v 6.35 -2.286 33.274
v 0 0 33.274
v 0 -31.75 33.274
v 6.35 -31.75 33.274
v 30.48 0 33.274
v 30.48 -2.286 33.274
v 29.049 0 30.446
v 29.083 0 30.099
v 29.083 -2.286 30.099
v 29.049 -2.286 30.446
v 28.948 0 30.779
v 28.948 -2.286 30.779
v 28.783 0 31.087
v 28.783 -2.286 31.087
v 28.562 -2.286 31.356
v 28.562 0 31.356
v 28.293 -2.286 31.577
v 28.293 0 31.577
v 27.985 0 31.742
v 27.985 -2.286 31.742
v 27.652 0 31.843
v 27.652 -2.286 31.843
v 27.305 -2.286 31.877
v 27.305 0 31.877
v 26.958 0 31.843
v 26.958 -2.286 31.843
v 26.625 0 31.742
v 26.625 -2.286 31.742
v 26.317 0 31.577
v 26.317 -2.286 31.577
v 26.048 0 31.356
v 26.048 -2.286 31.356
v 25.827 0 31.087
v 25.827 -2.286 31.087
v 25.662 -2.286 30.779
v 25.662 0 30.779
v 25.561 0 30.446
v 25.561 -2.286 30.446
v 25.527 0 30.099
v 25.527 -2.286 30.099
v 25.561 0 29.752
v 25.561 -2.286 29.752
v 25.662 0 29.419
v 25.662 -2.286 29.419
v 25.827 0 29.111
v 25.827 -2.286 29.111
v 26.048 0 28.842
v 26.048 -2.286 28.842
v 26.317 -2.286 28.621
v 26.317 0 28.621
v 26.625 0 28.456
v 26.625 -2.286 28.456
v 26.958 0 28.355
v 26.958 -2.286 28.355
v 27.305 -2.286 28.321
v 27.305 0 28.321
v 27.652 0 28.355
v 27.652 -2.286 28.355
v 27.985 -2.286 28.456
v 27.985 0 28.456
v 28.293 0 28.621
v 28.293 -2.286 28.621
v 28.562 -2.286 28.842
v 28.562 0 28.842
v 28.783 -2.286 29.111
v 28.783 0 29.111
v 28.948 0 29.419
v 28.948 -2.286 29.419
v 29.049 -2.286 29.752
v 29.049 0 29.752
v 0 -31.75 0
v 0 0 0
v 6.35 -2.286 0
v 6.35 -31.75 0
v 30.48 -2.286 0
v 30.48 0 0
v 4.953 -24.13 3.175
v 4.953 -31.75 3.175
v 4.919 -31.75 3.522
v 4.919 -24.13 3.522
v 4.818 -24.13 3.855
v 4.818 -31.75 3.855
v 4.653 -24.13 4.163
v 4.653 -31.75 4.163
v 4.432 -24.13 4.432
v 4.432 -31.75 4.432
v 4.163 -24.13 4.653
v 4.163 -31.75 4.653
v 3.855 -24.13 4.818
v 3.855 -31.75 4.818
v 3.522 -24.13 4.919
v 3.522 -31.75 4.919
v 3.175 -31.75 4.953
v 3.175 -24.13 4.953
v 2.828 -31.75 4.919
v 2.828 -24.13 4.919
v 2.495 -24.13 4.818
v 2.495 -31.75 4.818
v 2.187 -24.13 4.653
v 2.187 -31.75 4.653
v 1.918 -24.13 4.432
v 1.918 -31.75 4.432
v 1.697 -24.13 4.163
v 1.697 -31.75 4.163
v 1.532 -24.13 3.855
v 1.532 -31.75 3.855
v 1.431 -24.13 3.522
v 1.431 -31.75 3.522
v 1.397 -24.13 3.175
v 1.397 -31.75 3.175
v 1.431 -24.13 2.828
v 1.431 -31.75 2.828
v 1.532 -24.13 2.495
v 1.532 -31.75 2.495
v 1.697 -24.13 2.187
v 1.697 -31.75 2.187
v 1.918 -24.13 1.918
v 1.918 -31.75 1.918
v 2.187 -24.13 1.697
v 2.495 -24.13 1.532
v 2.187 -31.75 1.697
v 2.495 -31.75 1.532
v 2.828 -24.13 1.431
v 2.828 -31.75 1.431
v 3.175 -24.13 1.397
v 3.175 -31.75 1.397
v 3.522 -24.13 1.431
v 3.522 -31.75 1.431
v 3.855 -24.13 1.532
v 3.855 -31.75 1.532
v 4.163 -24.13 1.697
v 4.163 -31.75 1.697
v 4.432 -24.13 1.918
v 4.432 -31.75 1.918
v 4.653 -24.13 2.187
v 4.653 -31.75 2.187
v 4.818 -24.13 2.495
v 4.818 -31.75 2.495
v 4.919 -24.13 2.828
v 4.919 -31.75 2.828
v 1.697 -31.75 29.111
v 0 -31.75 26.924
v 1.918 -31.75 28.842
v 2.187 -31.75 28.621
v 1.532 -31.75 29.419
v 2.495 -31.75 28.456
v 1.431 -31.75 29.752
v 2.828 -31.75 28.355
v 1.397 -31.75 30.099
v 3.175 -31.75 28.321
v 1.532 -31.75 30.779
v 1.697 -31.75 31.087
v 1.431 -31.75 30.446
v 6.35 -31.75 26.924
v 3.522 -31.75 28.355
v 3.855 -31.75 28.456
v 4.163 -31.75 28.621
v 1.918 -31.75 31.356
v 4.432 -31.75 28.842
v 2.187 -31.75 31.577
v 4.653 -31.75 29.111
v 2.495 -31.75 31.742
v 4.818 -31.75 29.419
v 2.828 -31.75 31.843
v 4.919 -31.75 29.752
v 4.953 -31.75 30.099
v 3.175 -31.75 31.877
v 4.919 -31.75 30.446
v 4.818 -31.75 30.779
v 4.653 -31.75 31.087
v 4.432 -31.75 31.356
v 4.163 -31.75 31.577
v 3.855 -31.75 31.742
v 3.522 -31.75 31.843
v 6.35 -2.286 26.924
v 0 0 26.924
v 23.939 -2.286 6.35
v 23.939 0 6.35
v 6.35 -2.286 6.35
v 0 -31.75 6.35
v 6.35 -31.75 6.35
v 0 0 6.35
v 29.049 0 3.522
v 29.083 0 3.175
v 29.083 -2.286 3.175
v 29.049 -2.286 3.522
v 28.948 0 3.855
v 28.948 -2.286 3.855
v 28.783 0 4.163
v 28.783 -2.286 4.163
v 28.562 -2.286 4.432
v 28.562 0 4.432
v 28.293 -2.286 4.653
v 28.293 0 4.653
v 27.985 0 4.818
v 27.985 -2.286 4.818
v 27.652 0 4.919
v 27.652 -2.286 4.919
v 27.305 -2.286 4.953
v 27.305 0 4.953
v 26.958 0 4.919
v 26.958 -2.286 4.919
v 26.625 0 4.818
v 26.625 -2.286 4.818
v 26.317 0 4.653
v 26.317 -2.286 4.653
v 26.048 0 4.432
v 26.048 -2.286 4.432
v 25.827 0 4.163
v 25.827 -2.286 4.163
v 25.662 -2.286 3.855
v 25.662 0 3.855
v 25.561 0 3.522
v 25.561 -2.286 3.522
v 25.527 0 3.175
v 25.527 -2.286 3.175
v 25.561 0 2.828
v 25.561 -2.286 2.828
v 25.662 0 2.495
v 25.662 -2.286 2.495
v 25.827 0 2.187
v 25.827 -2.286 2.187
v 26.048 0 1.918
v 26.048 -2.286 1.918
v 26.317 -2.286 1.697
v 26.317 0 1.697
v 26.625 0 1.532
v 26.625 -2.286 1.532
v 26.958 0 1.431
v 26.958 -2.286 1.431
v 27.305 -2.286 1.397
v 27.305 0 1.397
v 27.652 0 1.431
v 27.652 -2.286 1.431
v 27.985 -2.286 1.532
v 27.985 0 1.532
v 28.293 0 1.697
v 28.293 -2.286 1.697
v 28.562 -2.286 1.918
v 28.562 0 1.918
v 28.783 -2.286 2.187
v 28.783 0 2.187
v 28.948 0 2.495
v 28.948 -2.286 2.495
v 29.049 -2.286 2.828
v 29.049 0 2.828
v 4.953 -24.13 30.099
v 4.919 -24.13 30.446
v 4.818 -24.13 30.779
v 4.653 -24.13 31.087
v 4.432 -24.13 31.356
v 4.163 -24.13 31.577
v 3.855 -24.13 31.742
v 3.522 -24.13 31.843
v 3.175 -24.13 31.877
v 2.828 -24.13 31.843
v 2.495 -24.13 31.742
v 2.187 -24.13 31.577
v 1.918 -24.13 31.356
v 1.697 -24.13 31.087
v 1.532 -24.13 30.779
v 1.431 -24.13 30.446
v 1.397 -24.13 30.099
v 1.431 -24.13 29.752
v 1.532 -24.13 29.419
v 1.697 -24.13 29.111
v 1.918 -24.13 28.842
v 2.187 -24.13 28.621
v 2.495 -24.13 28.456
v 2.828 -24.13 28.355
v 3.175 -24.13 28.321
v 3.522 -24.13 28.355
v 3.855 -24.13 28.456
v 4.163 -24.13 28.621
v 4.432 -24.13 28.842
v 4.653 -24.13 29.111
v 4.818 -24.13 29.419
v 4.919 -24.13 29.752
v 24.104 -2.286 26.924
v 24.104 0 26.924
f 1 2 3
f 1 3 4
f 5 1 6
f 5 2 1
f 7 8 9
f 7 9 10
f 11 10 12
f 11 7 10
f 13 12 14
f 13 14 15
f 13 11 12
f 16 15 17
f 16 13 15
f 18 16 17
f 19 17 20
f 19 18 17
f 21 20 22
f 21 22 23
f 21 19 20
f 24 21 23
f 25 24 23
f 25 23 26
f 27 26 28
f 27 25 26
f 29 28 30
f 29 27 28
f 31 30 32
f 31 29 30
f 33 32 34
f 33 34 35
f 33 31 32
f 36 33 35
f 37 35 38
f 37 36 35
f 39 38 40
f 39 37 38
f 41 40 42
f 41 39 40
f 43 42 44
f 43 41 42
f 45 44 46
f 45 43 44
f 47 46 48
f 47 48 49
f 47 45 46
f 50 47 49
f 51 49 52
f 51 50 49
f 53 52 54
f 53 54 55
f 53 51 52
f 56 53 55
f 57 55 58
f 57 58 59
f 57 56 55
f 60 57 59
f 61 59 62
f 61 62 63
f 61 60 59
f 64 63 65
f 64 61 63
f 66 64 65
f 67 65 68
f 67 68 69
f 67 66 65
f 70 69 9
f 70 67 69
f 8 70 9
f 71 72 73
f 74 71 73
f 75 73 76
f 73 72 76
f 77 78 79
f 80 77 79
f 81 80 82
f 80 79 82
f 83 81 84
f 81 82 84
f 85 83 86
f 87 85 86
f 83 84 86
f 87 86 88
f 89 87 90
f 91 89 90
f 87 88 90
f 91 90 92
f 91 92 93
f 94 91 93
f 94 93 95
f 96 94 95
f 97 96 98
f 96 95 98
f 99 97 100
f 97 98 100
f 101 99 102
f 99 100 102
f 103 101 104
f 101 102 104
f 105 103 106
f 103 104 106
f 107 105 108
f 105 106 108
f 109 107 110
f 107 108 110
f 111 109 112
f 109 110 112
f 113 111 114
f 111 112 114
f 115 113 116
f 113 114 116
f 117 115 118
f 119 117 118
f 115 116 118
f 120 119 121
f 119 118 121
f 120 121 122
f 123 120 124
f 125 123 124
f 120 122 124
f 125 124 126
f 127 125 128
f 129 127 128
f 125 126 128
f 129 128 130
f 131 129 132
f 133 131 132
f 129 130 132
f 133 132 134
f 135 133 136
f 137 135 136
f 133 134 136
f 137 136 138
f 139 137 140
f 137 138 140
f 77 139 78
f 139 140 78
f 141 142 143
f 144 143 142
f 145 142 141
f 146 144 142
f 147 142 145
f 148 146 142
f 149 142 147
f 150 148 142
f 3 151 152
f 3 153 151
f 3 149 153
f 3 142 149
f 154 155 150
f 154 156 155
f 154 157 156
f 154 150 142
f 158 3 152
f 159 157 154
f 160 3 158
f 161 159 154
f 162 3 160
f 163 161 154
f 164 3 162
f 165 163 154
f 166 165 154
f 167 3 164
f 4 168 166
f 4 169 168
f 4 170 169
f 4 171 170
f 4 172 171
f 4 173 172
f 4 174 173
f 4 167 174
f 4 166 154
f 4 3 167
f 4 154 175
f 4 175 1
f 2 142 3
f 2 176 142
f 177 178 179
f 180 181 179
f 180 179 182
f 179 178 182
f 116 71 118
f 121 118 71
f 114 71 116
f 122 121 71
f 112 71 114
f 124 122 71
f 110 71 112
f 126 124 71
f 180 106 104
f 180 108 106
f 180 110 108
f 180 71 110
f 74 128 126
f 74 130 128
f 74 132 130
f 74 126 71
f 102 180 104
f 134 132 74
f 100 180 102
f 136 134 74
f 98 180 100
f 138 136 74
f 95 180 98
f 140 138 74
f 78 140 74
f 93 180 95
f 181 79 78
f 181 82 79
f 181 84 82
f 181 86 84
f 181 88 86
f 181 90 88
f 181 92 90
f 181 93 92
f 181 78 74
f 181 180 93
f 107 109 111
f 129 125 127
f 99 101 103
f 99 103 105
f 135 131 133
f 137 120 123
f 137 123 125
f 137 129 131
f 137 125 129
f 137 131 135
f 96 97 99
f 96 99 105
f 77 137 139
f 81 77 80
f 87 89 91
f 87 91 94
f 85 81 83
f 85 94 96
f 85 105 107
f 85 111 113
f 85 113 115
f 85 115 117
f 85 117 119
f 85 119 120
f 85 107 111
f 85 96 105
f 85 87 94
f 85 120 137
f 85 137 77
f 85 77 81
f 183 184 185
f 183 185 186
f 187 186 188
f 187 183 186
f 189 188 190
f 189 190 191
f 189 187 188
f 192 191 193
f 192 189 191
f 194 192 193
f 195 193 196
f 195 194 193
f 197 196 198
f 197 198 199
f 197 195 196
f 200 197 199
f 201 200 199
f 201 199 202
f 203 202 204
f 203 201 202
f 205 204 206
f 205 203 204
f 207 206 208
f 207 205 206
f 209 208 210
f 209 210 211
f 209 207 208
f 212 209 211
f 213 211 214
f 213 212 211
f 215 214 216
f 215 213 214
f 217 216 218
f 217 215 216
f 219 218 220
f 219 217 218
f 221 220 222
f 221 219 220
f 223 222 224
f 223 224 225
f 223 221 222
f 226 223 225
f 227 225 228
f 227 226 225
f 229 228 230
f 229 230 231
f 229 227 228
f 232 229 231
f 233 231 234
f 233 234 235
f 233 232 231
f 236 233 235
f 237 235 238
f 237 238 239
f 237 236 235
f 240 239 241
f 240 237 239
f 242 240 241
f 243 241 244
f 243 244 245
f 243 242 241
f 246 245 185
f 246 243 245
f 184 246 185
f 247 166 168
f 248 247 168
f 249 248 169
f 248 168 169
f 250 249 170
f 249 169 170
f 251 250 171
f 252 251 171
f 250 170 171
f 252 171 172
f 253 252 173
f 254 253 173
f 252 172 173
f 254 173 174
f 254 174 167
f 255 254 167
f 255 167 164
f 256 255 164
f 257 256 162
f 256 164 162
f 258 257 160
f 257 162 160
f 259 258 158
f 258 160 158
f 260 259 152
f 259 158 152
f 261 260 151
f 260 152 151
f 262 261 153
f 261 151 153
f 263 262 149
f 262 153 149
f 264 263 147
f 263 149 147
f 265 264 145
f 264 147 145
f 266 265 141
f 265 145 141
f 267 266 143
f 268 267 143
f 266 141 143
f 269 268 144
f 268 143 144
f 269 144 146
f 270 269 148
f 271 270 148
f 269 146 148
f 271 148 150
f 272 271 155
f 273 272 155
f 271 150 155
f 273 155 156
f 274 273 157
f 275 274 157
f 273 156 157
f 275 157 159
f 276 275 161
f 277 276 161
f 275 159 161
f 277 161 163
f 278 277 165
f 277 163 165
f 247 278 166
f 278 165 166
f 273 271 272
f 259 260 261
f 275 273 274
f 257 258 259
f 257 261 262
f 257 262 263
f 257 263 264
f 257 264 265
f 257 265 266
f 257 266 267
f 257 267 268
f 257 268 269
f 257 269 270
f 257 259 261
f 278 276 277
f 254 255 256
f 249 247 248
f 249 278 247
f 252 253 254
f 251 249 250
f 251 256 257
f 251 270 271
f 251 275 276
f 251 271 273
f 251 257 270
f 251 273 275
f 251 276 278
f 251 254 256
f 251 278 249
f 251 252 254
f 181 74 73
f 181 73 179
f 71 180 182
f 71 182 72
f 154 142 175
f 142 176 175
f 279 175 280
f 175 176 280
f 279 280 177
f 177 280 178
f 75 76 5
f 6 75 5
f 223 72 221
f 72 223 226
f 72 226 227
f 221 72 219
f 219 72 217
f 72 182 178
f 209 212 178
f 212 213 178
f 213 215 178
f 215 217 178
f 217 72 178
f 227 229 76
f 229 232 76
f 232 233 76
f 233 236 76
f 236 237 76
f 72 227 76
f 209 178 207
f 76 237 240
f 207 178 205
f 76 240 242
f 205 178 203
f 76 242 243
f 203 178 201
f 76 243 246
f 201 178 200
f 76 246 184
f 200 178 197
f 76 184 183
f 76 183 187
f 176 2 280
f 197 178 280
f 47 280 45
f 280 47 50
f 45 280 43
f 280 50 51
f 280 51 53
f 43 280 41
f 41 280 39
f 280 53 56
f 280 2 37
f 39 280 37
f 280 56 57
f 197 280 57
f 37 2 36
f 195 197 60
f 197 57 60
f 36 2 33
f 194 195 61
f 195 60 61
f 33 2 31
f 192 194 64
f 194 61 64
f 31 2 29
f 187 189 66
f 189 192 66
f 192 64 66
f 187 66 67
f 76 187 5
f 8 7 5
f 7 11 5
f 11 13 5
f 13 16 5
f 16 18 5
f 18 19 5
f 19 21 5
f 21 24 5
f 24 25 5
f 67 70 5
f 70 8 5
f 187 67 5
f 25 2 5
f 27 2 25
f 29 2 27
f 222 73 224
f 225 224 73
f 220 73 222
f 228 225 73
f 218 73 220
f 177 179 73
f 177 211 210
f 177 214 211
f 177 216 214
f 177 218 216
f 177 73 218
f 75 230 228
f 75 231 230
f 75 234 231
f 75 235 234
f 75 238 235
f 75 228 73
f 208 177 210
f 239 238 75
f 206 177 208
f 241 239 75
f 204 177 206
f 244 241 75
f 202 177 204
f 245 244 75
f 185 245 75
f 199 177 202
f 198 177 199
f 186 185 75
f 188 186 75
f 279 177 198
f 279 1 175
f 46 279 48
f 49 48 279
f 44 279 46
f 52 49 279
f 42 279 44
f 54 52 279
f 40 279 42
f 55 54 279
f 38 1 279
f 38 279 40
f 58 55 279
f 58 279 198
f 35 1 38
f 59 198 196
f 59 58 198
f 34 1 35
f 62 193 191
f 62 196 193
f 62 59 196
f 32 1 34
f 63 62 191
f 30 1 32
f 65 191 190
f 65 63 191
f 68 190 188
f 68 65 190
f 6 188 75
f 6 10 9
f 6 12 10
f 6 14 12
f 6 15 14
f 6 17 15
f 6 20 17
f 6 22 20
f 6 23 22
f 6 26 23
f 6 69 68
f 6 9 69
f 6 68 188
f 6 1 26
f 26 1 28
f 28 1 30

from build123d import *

# Parameters (mm, degrees)
F0_R     = 1.778
F1_DEPTH = 2.286
F2_W     = 6.35
F2_H     = 6.35
F3_DEPTH = 29.464
F4_R     = 1.778
F5_DEPTH = 7.62


with BuildPart() as f1:
    # F0 (on Front) → F1 (new body)
    with BuildSketch(Plane.XZ):
        Polygon((0, 6.35), (0, 0), (23.887912, 0), (30.48, 0), (30.48, 33.274), (0, 33.274), (0, 26.924), (24.104372, 26.924), (23.938964, 6.35), align=None)
        with Locations((27.305, 3.175)):
            Circle(F0_R, mode=Mode.SUBTRACT)
        with Locations((27.305, 30.099)):
            Circle(F0_R, mode=Mode.SUBTRACT)
    extrude(amount=F1_DEPTH)

    # F2 (on face) → F3 (join)
    with BuildSketch(Plane.XZ.offset(2.286)):
        with Locations((3.175, 30.099)):
            Rectangle(F2_W, F2_H)
        with Locations((3.175, 3.175)):
            Rectangle(F2_W, F2_H)
    extrude(amount=F3_DEPTH)

    # F4 (on face) → F5 (cut)
    with BuildSketch(Plane.XZ.offset(31.75)):
        with Locations((3.175, 30.099)):
            Circle(F4_R)
        with Locations((3.175, 3.175)):
            Circle(F4_R)
    extrude(amount=-F5_DEPTH, mode=Mode.SUBTRACT)


solid = f1.part
